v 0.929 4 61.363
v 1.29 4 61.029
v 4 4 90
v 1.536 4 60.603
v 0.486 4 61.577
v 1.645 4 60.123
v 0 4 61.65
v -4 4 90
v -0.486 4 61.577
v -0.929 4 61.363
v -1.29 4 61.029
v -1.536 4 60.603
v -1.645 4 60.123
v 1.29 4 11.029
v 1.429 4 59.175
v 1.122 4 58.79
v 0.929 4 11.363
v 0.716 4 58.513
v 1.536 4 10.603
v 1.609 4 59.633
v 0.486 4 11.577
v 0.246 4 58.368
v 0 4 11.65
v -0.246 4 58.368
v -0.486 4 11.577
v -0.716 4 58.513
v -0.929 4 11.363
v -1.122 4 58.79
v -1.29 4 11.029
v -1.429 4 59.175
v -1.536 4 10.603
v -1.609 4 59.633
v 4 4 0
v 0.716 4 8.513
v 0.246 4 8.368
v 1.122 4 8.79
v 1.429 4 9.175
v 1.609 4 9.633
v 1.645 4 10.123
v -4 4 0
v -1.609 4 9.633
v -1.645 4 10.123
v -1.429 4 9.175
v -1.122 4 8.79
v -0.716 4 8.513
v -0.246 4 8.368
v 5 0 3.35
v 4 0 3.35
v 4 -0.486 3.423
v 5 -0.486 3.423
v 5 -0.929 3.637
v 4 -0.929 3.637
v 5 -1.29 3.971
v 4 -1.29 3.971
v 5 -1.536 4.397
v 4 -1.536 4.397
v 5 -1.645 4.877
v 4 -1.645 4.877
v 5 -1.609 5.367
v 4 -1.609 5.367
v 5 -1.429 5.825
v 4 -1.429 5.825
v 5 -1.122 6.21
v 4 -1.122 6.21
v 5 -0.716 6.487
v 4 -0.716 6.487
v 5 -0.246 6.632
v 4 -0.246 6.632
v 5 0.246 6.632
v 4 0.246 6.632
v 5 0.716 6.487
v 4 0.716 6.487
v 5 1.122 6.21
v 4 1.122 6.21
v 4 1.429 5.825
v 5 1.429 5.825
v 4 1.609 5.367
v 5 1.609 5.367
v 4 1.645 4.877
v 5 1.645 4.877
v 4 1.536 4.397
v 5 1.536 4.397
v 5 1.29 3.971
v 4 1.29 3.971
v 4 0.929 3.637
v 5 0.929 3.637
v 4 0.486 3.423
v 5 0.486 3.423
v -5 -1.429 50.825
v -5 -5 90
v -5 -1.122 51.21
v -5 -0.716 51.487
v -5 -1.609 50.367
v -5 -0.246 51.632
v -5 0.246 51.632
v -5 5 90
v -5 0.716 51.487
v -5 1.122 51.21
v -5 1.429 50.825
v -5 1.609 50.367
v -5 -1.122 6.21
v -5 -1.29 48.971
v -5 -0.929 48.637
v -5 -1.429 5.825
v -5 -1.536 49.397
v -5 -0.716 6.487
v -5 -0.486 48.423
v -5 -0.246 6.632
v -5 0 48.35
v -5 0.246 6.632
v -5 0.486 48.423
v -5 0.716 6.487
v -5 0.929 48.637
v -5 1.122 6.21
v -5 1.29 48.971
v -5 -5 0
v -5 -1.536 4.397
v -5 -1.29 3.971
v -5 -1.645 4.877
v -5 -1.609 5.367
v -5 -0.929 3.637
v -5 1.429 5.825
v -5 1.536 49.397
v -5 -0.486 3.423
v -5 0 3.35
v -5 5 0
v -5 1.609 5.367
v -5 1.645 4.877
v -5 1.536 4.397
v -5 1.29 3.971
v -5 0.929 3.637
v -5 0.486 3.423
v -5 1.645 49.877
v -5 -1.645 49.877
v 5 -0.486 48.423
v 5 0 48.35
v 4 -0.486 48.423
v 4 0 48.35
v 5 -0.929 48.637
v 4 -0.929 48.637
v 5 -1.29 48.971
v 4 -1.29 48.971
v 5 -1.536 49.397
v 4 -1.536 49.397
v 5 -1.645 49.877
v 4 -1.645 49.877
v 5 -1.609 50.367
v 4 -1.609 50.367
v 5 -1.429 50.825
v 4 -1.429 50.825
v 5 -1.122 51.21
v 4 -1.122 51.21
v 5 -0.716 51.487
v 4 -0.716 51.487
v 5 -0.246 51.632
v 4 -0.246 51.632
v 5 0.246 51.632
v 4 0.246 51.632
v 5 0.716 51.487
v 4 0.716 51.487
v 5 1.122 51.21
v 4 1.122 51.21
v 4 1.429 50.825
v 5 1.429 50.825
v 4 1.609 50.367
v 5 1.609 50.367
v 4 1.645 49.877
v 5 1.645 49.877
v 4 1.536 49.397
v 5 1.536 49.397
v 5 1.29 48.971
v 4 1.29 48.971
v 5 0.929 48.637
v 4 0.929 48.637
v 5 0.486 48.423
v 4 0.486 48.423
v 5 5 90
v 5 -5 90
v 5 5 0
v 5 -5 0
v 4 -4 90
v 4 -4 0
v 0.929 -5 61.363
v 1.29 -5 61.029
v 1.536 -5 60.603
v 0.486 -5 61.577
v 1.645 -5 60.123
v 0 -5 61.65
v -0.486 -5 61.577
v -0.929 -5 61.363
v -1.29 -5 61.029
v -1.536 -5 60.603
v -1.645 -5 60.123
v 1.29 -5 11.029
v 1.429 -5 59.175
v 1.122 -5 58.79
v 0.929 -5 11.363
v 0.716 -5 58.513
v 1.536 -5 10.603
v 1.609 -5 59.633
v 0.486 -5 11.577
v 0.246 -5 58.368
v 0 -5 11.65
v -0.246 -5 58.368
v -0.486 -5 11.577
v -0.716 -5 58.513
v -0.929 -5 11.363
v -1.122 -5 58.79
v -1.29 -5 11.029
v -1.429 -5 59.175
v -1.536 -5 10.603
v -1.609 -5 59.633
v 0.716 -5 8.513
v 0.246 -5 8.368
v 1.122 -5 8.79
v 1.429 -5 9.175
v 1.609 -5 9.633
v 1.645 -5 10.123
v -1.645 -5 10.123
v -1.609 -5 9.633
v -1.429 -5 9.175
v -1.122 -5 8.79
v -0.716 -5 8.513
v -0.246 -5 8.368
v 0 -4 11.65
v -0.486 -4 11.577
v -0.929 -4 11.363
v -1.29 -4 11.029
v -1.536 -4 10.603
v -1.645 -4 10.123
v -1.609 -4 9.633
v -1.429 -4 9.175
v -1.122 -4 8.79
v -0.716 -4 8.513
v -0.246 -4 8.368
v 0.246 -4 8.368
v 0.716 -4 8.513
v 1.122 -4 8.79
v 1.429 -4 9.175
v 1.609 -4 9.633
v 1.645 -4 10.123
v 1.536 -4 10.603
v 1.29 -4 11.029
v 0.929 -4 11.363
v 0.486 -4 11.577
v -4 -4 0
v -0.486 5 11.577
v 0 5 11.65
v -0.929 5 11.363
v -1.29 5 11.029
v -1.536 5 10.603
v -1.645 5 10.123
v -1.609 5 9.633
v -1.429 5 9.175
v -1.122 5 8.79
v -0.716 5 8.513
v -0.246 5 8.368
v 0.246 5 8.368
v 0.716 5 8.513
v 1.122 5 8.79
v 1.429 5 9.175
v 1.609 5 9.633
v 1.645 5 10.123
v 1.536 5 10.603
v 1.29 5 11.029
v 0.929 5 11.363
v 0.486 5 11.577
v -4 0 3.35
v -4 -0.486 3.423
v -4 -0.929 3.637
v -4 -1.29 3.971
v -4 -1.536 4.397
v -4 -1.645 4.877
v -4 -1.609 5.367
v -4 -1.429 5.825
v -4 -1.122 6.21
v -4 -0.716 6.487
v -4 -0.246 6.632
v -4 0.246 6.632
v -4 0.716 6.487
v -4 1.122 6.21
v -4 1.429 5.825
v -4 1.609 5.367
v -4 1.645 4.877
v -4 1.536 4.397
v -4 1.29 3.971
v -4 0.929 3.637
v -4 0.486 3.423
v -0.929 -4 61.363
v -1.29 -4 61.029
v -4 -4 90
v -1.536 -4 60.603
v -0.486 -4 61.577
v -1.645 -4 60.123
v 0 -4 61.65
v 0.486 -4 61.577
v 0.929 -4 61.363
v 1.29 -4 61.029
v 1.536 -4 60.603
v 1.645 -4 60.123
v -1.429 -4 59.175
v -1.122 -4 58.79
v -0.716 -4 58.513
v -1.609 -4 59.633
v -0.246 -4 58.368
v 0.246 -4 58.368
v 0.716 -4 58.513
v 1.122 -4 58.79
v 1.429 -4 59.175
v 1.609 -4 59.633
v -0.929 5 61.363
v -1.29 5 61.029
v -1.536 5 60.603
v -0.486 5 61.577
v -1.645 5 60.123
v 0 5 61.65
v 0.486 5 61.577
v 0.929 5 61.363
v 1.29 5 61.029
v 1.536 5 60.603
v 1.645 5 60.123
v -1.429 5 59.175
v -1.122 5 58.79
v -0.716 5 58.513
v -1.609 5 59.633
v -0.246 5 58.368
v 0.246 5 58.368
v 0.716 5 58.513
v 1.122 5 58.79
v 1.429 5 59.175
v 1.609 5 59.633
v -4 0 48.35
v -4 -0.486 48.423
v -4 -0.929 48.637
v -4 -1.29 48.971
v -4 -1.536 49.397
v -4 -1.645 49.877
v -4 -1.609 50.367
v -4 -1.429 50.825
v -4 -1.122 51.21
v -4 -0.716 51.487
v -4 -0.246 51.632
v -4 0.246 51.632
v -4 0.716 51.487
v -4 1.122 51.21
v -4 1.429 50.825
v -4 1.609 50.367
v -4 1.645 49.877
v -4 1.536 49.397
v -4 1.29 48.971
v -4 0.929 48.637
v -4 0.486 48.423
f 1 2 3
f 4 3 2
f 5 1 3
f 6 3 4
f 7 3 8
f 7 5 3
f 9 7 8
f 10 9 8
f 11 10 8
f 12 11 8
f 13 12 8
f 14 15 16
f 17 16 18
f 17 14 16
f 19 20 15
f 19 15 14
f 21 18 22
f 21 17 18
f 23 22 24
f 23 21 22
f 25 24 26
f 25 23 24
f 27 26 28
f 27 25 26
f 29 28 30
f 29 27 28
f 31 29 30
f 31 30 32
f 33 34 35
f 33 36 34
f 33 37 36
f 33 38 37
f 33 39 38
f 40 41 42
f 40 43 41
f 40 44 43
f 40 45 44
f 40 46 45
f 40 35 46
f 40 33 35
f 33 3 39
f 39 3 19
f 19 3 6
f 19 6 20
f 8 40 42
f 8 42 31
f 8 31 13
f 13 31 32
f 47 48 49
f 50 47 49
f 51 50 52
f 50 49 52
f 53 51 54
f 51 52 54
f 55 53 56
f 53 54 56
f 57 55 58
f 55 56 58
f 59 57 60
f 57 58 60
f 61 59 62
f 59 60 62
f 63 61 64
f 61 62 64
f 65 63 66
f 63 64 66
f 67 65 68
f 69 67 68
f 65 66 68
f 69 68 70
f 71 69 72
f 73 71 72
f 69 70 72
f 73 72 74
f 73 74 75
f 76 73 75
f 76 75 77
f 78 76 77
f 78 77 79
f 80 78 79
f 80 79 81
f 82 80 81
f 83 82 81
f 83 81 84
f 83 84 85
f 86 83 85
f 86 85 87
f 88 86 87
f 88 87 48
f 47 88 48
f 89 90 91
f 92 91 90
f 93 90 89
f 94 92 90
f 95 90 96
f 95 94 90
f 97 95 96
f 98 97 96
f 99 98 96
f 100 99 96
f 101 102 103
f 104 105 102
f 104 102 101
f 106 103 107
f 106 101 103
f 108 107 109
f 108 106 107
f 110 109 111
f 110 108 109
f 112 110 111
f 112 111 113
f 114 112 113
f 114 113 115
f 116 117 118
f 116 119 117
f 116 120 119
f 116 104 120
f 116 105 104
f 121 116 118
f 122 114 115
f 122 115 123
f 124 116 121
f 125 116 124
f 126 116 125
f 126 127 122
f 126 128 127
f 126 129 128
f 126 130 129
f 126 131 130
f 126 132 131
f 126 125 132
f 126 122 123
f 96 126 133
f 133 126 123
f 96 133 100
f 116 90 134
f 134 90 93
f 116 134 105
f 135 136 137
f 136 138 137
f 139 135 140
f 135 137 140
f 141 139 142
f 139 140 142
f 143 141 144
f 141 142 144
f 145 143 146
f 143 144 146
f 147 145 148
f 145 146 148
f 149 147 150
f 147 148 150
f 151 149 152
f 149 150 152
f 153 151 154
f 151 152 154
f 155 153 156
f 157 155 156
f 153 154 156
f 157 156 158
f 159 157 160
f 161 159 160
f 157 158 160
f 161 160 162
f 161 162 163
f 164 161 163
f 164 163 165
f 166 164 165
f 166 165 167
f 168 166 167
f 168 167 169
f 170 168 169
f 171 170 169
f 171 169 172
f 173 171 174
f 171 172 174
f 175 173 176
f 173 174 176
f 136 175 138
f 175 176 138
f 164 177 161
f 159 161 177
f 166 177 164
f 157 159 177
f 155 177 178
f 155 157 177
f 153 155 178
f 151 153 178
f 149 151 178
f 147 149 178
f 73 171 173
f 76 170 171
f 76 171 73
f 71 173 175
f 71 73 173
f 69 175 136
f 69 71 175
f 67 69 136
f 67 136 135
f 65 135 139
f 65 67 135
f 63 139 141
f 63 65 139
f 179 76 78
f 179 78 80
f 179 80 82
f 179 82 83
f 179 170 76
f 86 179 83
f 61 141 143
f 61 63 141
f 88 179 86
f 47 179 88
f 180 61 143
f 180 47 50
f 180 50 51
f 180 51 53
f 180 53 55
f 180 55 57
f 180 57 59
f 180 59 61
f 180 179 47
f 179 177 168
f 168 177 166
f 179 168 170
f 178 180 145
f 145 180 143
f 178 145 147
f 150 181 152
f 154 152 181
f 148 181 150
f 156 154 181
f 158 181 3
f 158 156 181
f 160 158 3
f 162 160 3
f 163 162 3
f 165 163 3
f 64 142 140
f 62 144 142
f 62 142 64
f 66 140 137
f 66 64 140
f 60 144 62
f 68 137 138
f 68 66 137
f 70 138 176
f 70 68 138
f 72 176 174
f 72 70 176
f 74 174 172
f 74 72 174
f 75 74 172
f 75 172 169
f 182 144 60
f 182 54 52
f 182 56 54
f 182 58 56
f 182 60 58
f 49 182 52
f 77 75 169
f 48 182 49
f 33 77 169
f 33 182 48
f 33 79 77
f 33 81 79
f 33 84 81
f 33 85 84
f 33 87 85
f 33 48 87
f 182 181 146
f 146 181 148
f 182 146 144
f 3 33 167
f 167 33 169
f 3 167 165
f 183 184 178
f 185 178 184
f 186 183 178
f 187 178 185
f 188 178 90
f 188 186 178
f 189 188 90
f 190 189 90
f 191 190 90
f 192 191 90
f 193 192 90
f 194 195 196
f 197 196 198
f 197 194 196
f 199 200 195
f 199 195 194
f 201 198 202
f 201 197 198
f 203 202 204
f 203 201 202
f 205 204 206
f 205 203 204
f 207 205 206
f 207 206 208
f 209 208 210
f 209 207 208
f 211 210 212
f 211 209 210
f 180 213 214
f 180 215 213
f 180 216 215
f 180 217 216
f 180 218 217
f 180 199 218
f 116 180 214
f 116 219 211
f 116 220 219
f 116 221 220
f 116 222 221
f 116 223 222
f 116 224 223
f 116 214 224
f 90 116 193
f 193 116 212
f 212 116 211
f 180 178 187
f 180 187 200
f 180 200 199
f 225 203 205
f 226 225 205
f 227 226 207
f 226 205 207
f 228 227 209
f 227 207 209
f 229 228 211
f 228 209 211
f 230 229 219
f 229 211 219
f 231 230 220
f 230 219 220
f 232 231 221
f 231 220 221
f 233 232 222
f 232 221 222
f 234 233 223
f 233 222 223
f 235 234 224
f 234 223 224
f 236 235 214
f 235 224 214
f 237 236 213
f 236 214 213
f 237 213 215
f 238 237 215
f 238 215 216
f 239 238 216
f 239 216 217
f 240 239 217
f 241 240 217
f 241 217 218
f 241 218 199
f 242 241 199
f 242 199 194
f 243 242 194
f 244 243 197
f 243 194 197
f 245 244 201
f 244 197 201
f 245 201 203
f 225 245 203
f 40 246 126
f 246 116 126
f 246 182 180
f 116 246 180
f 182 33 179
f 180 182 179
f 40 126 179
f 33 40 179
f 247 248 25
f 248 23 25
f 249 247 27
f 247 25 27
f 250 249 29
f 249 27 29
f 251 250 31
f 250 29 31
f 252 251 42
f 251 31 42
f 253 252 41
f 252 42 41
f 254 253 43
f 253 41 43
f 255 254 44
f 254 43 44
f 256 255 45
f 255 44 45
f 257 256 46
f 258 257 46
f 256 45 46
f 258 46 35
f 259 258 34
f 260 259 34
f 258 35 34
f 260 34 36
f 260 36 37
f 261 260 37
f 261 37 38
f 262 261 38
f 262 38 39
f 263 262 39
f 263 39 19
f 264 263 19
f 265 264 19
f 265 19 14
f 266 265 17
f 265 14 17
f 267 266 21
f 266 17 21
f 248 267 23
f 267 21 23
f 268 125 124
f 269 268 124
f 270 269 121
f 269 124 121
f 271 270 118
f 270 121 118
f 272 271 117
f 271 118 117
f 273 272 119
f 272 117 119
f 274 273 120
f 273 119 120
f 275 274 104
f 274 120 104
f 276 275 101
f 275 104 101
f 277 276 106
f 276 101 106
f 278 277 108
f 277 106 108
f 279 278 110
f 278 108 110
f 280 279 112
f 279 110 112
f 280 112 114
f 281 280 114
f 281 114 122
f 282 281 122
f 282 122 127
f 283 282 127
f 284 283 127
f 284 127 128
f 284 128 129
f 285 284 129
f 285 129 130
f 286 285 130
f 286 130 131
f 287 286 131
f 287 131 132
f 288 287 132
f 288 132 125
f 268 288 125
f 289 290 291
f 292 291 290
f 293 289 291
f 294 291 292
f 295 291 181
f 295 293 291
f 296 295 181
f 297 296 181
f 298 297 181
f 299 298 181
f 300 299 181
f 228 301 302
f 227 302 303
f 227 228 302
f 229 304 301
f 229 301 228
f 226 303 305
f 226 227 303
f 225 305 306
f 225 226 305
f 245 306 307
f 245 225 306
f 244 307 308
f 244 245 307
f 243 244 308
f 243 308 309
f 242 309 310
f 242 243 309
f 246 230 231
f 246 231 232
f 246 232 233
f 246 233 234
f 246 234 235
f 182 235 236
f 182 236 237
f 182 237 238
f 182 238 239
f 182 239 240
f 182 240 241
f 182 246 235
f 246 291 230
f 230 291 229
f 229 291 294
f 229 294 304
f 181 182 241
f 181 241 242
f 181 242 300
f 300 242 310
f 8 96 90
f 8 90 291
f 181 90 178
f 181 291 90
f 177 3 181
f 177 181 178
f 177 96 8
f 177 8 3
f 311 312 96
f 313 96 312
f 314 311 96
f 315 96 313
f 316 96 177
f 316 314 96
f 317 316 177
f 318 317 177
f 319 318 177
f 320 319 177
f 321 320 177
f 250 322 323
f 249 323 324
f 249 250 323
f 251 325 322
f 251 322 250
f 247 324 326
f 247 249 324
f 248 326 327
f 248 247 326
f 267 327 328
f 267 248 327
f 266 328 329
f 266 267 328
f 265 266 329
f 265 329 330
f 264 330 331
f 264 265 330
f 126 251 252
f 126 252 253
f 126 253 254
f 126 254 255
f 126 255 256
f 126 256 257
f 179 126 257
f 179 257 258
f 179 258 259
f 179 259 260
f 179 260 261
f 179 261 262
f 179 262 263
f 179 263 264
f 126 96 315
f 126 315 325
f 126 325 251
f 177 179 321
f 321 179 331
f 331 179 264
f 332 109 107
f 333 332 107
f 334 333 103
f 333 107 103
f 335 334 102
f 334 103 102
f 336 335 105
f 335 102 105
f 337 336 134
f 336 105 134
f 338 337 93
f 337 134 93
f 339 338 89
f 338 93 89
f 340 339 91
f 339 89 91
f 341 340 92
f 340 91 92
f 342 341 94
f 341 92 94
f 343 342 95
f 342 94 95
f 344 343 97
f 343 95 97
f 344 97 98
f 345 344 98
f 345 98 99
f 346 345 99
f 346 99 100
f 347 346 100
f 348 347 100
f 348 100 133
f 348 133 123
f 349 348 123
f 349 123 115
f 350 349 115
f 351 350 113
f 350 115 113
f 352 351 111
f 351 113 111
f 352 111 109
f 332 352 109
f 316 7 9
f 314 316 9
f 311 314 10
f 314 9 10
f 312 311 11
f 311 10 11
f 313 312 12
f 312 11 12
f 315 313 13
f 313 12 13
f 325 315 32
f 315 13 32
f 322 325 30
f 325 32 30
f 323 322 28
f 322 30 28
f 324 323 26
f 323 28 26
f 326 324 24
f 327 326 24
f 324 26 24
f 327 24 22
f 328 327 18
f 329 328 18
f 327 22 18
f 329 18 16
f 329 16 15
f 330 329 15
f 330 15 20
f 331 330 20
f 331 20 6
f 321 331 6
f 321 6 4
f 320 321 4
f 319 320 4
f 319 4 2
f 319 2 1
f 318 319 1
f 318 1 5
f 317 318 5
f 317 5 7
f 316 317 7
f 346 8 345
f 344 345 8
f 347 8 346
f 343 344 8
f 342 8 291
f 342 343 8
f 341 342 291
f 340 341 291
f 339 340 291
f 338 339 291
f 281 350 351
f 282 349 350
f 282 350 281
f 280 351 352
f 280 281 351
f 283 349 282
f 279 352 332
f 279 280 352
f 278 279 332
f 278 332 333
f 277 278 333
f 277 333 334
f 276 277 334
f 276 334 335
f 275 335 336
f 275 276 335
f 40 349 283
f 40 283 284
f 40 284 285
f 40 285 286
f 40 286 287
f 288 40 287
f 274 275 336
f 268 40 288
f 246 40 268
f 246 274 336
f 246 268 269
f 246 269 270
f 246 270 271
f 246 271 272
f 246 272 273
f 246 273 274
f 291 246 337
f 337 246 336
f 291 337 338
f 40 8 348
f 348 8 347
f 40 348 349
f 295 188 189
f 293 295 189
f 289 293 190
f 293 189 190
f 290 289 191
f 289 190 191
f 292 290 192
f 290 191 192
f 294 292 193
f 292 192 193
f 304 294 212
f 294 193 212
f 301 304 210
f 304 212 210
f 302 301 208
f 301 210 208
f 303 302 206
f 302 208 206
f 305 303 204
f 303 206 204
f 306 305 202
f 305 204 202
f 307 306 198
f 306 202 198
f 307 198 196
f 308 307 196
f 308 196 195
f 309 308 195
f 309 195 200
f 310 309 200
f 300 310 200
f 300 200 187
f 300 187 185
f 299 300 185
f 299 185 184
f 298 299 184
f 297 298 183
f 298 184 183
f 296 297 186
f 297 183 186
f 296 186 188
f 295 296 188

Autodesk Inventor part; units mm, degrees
ref_plane "YZ Plane" through (0, 0, 0) normal (1, 0, 0) x (0, 1, 0)
ref_plane "XZ Plane" through (0, 0, 0) normal (0, 1, 0) x (-1, 0, 0)
ref_plane "XY Plane" through (0, 0, 0) normal (0, 0, 1) x (1, 0, 0)
sketch "スケッチ1" plane through (0, 0, 0) normal (0, 0, 1) x (1, 0, 0)
  line L0 (5, -5) -> (-5, -5)
  line L1 (-5, -5) -> (-5, 5)
  line L2 (-5, 5) -> (5, 5)
  line L3 (5, 5) -> (5, -5)
  line L4 (5, -5) -> (-5, 5) construction
  line L5 (-5, -5) -> (5, 5) construction
  line L6 (4, 4) -> (-4, 4)
  line L7 (-4, 4) -> (-4, -4)
  line L8 (-4, -4) -> (4, -4)
  line L9 (4, -4) -> (4, 4)
  point P0 (0, 0)
  dimension "d0" = 10
  dimension "d1" = 10
  dimension "d2" = 1
extrude "押し出し1" add sketch "スケッチ1" along normal blind 90
sketch "スケッチ2" plane through (5, -5, 0) normal (1, 0, 0) x (0, 0, -1)
  line L0 (0, 0) -> (0, 10) projected
  line L1 (0, 10) -> (-90, 10) projected
  line L2 (-90, 0) -> (-90, 10) projected
  line L3 (0, 0) -> (-90, 0) projected
  line L4 (-90, 5) -> (0, 5)
  point P0 (-50, 5)
  point P1 (-5, 5)
  dimension "d5" = 45
  dimension "d6" = 5
hole "穴1" at (5, 0, 50) at (5, 0, 5) direction (-1, 0, 0) diameter 3.3 end through all
sketch "スケッチ3" plane through (-5, 5, 0) normal (0, 1, 0) x (1, 0, 0)
  line L0 (10, 0) -> (0, 0) projected
  line L1 (0, 0) -> (0, -90) projected
  line L2 (10, -90) -> (0, -90) projected
  line L3 (10, 0) -> (10, -90) projected
  line L4 (5, -90) -> (5, 0)
  point P0 (5, -60)
  point P1 (5, -10)
  dimension "d14" = 50
  dimension "d15" = 10
hole "穴2" at (0, 5, 60) at (0, 5, 10) direction (0, -1, 0) diameter 3.3 end through all
properties part number "kaku_1010_120"
